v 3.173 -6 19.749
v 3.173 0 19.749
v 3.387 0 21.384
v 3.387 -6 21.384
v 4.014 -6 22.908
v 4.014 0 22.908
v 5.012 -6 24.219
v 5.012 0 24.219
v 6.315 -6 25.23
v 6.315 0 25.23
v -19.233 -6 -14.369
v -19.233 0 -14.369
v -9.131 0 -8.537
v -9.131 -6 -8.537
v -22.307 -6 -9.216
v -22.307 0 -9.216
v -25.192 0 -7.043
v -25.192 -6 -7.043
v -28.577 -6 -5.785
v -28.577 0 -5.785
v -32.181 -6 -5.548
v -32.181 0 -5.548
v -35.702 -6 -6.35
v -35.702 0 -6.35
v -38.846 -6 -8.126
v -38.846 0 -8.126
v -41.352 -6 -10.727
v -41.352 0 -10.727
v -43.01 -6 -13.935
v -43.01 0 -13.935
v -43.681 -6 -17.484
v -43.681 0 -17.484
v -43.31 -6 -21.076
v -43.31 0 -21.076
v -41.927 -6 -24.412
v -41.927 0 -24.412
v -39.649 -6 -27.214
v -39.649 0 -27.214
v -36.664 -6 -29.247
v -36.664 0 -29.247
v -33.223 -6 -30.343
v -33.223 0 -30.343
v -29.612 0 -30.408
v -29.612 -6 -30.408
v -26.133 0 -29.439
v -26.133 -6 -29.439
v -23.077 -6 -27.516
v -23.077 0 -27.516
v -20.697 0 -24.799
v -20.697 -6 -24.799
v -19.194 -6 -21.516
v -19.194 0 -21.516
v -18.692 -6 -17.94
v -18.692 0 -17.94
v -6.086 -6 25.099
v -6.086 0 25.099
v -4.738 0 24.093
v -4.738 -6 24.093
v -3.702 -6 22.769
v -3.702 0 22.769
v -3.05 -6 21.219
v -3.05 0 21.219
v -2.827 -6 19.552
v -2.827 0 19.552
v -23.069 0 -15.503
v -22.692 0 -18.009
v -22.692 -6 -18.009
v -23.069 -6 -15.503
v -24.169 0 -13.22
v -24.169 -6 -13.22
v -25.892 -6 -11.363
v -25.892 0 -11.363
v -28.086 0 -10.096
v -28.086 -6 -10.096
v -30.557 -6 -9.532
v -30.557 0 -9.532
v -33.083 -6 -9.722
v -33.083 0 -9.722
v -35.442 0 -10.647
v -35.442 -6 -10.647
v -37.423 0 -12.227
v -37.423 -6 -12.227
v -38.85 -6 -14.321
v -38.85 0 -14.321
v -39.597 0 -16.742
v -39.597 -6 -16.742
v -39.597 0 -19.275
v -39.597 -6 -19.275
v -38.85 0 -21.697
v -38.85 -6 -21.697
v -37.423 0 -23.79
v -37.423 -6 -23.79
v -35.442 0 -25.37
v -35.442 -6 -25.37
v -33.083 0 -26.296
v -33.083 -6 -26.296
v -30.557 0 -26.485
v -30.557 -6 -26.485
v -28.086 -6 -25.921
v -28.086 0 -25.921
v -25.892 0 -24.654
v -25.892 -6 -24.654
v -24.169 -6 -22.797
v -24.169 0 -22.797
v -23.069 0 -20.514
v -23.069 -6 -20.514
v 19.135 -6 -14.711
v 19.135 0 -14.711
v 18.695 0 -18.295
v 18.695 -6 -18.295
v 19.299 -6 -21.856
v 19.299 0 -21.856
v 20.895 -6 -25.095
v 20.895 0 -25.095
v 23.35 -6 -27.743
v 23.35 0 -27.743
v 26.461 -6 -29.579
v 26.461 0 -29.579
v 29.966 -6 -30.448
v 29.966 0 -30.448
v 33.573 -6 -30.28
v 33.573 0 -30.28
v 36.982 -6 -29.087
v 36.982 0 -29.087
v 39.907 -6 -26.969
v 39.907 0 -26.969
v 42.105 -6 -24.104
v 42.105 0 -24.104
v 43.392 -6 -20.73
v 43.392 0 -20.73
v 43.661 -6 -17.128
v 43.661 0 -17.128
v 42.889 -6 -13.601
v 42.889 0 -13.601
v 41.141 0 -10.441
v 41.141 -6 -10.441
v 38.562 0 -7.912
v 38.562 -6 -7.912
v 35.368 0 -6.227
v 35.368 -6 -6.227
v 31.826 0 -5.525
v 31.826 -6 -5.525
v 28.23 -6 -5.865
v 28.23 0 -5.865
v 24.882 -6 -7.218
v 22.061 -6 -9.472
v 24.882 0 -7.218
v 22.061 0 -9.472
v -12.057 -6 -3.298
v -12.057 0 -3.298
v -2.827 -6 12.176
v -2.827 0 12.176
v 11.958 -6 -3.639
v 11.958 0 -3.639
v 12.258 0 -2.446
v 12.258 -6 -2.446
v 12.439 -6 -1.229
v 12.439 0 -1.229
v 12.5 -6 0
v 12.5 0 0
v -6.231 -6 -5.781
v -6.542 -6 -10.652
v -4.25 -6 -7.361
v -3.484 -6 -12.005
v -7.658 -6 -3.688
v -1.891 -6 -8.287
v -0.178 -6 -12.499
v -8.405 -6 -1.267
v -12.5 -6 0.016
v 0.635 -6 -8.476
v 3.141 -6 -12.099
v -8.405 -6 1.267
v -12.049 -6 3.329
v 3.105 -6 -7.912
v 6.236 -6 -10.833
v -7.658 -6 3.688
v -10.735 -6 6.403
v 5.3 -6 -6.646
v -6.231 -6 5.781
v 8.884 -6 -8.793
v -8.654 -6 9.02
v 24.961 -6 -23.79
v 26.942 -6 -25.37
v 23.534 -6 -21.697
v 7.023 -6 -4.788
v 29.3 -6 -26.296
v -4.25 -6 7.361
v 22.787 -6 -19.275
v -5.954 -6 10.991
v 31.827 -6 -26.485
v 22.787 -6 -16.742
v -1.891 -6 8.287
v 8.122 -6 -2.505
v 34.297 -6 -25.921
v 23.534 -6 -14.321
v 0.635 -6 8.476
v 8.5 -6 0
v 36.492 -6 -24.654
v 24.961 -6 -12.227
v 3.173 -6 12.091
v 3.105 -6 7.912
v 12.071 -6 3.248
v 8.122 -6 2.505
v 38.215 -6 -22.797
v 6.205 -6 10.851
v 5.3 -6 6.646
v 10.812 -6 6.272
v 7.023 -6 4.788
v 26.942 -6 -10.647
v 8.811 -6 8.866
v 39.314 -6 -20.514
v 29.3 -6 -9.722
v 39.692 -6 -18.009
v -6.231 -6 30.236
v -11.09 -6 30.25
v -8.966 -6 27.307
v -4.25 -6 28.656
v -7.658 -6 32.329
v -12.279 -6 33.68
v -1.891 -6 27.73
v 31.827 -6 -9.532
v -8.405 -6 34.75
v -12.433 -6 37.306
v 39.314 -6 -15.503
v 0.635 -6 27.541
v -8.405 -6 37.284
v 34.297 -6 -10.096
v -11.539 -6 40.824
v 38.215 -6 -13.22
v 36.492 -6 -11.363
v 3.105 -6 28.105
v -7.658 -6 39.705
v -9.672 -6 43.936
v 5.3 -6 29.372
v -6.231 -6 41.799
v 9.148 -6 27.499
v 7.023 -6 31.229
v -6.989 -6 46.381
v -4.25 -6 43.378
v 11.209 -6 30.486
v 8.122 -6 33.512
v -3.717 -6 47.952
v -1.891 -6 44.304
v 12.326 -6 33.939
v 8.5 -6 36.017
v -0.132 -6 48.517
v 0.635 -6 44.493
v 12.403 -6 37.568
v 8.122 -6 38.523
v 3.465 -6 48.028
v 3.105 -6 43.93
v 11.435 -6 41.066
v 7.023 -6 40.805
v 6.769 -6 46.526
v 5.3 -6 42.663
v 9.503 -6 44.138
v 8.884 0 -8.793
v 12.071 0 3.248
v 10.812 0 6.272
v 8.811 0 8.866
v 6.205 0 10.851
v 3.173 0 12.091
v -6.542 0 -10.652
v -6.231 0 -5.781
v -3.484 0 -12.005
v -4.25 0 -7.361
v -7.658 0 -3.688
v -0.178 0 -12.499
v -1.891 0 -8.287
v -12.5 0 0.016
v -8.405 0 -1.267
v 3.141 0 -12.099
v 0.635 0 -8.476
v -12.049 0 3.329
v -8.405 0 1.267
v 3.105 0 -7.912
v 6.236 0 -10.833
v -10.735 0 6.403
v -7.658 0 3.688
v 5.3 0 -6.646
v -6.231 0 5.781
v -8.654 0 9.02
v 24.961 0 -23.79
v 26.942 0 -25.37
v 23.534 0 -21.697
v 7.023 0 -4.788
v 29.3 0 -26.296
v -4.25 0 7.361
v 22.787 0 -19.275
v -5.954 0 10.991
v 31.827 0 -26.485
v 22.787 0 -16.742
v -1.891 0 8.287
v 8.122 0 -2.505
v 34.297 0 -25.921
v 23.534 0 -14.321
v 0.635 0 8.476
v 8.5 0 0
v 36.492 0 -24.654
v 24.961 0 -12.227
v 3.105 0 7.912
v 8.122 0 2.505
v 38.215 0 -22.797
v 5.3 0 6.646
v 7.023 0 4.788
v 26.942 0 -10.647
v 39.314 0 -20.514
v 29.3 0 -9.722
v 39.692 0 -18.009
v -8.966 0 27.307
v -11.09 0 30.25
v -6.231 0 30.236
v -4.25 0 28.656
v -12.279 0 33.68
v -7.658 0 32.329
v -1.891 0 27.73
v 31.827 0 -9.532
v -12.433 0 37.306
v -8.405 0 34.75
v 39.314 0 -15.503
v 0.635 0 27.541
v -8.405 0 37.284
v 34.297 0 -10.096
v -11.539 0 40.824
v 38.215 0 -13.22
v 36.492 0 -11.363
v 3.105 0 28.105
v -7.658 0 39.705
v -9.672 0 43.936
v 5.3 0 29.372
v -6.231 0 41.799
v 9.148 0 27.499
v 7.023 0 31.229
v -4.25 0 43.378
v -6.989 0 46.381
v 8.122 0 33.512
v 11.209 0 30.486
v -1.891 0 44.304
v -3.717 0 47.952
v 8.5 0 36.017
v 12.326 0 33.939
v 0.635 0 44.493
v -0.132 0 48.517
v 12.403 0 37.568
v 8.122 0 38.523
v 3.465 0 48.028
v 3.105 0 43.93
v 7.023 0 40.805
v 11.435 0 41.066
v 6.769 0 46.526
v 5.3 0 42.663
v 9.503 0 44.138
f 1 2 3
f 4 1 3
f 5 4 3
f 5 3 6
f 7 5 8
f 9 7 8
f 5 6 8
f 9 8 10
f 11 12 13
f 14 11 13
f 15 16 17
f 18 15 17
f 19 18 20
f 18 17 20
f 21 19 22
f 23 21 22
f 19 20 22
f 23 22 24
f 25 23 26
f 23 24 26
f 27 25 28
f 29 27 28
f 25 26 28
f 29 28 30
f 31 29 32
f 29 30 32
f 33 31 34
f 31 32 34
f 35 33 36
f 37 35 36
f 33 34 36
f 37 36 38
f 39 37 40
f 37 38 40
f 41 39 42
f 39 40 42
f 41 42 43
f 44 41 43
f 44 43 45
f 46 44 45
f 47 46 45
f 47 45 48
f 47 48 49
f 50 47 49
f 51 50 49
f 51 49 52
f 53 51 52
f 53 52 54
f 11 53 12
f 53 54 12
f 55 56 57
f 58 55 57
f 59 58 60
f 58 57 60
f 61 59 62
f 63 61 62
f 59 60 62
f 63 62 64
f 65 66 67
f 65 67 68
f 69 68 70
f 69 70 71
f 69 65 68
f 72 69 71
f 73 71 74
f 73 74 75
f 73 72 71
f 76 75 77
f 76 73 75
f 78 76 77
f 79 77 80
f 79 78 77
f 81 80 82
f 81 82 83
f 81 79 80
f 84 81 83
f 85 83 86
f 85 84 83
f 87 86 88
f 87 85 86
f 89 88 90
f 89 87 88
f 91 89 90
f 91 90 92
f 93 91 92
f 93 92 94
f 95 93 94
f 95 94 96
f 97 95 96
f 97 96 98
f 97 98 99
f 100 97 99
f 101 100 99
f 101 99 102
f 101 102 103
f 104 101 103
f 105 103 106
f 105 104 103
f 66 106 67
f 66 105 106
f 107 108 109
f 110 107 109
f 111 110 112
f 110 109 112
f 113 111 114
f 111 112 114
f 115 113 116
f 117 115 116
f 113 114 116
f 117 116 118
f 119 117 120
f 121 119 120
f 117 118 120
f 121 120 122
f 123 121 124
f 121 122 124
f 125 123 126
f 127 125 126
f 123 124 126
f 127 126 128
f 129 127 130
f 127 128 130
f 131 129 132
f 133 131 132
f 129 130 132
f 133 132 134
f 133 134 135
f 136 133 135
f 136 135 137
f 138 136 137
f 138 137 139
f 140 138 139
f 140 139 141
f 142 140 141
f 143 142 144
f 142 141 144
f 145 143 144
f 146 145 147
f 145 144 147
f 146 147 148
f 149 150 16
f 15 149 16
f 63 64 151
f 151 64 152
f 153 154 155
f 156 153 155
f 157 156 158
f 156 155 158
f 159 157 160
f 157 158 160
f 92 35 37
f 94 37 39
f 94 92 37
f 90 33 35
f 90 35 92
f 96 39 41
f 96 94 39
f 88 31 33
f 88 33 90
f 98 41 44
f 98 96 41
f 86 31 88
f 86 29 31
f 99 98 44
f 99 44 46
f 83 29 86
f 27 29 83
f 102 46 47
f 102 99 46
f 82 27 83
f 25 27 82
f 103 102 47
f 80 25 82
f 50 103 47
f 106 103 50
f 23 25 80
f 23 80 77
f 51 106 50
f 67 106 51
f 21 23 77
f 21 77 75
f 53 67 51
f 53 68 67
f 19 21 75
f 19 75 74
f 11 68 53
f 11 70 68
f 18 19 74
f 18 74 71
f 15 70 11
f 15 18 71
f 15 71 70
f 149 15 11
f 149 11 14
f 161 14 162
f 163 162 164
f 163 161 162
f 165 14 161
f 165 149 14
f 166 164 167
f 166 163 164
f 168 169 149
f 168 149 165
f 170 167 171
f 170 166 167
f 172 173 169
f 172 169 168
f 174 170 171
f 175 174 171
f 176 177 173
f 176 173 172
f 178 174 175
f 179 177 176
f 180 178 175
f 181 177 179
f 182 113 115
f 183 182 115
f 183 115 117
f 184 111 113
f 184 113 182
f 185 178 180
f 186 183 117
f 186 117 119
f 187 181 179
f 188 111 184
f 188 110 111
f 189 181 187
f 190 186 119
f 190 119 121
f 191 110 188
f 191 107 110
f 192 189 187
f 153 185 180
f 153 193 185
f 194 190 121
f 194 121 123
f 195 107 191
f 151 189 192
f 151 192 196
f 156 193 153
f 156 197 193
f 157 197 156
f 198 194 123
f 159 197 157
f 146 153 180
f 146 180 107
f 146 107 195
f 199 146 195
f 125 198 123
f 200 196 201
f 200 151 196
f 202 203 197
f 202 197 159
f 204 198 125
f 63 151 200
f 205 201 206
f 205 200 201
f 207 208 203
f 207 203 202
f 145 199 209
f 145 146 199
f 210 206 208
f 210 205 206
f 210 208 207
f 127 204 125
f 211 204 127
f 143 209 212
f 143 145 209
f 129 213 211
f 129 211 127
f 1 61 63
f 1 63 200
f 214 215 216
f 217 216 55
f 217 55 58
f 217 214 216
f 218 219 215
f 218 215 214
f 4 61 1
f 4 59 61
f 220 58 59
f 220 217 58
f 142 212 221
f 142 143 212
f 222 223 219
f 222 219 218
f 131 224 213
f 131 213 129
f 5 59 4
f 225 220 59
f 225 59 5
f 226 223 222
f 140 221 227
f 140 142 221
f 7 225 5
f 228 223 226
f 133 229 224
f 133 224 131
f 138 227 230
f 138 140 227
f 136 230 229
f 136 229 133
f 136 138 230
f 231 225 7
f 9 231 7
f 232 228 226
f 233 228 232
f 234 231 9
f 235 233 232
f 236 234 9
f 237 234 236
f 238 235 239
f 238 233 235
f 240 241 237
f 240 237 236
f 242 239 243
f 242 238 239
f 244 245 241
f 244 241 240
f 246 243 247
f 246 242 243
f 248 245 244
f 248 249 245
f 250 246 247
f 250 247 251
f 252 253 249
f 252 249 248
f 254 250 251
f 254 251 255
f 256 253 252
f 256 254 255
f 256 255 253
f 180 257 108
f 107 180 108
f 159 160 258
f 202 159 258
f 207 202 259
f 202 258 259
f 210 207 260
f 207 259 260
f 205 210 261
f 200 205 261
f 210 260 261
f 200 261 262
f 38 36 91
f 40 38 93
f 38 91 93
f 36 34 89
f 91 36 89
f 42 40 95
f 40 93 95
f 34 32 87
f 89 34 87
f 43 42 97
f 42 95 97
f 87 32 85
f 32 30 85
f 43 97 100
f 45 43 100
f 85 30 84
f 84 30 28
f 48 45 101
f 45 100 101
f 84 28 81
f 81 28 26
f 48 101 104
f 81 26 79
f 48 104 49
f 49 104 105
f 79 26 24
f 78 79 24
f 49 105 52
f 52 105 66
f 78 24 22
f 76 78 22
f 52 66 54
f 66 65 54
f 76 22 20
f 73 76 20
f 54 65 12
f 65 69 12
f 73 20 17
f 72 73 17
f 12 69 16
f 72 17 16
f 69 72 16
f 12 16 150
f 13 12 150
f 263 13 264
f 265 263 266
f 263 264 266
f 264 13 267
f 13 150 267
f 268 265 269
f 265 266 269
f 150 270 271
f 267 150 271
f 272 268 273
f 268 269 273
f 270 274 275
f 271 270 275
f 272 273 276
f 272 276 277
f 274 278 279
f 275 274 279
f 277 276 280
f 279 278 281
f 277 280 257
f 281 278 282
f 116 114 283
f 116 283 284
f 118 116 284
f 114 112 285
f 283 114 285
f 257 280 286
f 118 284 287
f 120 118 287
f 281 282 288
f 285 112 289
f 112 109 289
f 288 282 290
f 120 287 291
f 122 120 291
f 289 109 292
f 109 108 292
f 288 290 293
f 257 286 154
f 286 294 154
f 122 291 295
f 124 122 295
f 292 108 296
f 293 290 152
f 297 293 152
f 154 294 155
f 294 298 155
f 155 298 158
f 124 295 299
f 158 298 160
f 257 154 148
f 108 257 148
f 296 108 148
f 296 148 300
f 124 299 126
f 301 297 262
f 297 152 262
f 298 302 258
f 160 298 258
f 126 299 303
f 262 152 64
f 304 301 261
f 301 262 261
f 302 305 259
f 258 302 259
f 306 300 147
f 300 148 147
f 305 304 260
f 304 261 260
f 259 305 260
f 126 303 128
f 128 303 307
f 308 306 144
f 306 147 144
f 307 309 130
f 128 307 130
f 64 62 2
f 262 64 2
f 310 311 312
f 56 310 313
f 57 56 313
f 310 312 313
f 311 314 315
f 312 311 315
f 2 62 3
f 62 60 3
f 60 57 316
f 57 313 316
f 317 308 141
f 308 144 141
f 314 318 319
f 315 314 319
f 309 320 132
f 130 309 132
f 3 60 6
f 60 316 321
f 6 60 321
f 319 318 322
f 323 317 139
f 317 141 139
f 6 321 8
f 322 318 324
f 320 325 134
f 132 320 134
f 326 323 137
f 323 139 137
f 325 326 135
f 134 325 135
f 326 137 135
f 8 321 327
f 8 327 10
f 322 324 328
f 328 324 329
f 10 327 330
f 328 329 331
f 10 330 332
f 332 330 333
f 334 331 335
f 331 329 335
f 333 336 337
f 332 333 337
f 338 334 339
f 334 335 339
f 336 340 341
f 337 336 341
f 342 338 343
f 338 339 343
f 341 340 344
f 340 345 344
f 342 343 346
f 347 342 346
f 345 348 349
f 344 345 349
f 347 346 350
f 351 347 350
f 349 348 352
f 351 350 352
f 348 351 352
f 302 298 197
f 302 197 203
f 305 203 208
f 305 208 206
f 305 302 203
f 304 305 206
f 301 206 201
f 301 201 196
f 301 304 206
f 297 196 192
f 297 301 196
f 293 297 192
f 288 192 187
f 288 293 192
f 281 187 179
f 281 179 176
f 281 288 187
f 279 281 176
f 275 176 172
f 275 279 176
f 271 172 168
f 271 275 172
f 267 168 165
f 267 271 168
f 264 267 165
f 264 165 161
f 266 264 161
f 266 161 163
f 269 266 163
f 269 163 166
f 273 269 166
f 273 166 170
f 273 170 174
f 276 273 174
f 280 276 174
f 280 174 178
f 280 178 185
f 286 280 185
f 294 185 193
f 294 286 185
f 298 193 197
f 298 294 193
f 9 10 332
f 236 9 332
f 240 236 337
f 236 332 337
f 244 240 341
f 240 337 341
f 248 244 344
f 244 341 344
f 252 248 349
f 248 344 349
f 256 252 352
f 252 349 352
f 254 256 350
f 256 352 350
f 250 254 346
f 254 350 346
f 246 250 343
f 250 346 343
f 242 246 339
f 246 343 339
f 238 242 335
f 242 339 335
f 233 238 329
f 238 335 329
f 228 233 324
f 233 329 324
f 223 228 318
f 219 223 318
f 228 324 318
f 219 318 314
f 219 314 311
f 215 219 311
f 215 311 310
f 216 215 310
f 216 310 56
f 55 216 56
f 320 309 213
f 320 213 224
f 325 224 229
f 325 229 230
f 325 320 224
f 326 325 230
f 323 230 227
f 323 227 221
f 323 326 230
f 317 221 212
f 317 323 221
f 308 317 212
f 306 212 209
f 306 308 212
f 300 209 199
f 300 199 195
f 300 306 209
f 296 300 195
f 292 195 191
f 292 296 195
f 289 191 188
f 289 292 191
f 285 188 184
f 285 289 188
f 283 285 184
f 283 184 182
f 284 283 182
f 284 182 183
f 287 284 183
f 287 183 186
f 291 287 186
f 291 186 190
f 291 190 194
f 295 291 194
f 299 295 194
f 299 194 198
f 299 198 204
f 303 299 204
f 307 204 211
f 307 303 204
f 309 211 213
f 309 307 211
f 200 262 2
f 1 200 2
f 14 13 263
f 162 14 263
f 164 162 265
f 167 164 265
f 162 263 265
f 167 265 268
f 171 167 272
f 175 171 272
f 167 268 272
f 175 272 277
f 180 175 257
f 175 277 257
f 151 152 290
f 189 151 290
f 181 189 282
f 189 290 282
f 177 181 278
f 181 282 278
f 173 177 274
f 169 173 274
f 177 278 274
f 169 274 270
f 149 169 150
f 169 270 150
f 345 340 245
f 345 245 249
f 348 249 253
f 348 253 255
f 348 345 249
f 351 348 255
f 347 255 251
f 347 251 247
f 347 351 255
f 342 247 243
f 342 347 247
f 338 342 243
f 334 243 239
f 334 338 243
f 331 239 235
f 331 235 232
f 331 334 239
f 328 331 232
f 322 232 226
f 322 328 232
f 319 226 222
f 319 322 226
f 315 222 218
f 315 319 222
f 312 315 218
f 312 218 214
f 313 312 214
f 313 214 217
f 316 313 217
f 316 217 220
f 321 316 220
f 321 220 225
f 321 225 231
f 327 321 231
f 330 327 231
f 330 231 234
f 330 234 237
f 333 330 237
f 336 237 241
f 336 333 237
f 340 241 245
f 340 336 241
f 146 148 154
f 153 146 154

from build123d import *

# Parameters (mm, degrees)
F0_R     = 8.5
F1_DEPTH = 6


with BuildPart() as f1:
    # F0 (on Front) → F1 (new body)
    with BuildSketch(Plane.XZ):
        with BuildLine():
            ThreePointArc((12.5, 0), (9.897185, 7.635165), (3.172682, 12.090661))
            ThreePointArc((3.172682, 12.090661), (0.177882, 12.498734), (-2.827318, 12.176053))
            ThreePointArc((-2.827318, 12.176053), (-10.73528, 6.403418), (-12.057161, -3.297707))
            ThreePointArc((-12.057161, -3.297707), (-10.913162, -6.095317), (-9.131112, -8.536556))
            ThreePointArc((-9.131112, -8.536556), (-0.177882, -12.498734), (8.884479, -8.792954))
            ThreePointArc((8.884479, -8.792954), (10.73528, -6.403418), (11.95843, -3.639497))
            ThreePointArc((11.95843, -3.639497), (12.363866, -1.839785), (12.5, 0))
        make_face()
        Circle(F0_R, mode=Mode.SUBTRACT)
        with BuildLine():
            ThreePointArc((3.172682, 19.749459), (4.01393, 22.907963), (6.314776, 25.22959))
            ThreePointArc((6.314776, 25.22959), (-0.13188, 48.516555), (-6.085755, 25.098753))
            ThreePointArc((-6.085755, 25.098753), (-3.702196, 22.768604), (-2.827318, 19.552156))
            Line((-2.827318, 19.552156), (-2.827318, 12.176053))
            ThreePointArc((-2.827318, 12.176053), (0.177882, 12.498734), (3.172682, 12.090661))
            Line((3.172682, 12.090661), (3.172682, 19.749459))
        make_face()
        with Locations((0, 36.01725)):
            Circle(F0_R, mode=Mode.SUBTRACT)
        with BuildLine():
            ThreePointArc((-9.131112, -8.536556), (-10.913162, -6.095317), (-12.057161, -3.297707))
            Line((-12.057161, -3.297707), (-22.307375, -9.215671))
            ThreePointArc((-22.307375, -9.215671), (-41.927134, -24.412043), (-19.233423, -14.369128))
            Line((-19.233423, -14.369128), (-9.131112, -8.536556))
        make_face()
        with Locations((-31.191854, -18.008625)):
            Circle(F0_R, mode=Mode.SUBTRACT)
        with BuildLine():
            Line((22.060741, -9.472069), (11.95843, -3.639497))
            ThreePointArc((11.95843, -3.639497), (10.73528, -6.403418), (8.884479, -8.792954))
            Line((8.884479, -8.792954), (19.134693, -14.710918))
            ThreePointArc((19.134693, -14.710918), (42.105016, -24.103942), (22.060741, -9.472069))
        make_face()
        with Locations((31.191854, -18.008625)):
            Circle(F0_R, mode=Mode.SUBTRACT)
    extrude(amount=F1_DEPTH)


solid = f1.part
